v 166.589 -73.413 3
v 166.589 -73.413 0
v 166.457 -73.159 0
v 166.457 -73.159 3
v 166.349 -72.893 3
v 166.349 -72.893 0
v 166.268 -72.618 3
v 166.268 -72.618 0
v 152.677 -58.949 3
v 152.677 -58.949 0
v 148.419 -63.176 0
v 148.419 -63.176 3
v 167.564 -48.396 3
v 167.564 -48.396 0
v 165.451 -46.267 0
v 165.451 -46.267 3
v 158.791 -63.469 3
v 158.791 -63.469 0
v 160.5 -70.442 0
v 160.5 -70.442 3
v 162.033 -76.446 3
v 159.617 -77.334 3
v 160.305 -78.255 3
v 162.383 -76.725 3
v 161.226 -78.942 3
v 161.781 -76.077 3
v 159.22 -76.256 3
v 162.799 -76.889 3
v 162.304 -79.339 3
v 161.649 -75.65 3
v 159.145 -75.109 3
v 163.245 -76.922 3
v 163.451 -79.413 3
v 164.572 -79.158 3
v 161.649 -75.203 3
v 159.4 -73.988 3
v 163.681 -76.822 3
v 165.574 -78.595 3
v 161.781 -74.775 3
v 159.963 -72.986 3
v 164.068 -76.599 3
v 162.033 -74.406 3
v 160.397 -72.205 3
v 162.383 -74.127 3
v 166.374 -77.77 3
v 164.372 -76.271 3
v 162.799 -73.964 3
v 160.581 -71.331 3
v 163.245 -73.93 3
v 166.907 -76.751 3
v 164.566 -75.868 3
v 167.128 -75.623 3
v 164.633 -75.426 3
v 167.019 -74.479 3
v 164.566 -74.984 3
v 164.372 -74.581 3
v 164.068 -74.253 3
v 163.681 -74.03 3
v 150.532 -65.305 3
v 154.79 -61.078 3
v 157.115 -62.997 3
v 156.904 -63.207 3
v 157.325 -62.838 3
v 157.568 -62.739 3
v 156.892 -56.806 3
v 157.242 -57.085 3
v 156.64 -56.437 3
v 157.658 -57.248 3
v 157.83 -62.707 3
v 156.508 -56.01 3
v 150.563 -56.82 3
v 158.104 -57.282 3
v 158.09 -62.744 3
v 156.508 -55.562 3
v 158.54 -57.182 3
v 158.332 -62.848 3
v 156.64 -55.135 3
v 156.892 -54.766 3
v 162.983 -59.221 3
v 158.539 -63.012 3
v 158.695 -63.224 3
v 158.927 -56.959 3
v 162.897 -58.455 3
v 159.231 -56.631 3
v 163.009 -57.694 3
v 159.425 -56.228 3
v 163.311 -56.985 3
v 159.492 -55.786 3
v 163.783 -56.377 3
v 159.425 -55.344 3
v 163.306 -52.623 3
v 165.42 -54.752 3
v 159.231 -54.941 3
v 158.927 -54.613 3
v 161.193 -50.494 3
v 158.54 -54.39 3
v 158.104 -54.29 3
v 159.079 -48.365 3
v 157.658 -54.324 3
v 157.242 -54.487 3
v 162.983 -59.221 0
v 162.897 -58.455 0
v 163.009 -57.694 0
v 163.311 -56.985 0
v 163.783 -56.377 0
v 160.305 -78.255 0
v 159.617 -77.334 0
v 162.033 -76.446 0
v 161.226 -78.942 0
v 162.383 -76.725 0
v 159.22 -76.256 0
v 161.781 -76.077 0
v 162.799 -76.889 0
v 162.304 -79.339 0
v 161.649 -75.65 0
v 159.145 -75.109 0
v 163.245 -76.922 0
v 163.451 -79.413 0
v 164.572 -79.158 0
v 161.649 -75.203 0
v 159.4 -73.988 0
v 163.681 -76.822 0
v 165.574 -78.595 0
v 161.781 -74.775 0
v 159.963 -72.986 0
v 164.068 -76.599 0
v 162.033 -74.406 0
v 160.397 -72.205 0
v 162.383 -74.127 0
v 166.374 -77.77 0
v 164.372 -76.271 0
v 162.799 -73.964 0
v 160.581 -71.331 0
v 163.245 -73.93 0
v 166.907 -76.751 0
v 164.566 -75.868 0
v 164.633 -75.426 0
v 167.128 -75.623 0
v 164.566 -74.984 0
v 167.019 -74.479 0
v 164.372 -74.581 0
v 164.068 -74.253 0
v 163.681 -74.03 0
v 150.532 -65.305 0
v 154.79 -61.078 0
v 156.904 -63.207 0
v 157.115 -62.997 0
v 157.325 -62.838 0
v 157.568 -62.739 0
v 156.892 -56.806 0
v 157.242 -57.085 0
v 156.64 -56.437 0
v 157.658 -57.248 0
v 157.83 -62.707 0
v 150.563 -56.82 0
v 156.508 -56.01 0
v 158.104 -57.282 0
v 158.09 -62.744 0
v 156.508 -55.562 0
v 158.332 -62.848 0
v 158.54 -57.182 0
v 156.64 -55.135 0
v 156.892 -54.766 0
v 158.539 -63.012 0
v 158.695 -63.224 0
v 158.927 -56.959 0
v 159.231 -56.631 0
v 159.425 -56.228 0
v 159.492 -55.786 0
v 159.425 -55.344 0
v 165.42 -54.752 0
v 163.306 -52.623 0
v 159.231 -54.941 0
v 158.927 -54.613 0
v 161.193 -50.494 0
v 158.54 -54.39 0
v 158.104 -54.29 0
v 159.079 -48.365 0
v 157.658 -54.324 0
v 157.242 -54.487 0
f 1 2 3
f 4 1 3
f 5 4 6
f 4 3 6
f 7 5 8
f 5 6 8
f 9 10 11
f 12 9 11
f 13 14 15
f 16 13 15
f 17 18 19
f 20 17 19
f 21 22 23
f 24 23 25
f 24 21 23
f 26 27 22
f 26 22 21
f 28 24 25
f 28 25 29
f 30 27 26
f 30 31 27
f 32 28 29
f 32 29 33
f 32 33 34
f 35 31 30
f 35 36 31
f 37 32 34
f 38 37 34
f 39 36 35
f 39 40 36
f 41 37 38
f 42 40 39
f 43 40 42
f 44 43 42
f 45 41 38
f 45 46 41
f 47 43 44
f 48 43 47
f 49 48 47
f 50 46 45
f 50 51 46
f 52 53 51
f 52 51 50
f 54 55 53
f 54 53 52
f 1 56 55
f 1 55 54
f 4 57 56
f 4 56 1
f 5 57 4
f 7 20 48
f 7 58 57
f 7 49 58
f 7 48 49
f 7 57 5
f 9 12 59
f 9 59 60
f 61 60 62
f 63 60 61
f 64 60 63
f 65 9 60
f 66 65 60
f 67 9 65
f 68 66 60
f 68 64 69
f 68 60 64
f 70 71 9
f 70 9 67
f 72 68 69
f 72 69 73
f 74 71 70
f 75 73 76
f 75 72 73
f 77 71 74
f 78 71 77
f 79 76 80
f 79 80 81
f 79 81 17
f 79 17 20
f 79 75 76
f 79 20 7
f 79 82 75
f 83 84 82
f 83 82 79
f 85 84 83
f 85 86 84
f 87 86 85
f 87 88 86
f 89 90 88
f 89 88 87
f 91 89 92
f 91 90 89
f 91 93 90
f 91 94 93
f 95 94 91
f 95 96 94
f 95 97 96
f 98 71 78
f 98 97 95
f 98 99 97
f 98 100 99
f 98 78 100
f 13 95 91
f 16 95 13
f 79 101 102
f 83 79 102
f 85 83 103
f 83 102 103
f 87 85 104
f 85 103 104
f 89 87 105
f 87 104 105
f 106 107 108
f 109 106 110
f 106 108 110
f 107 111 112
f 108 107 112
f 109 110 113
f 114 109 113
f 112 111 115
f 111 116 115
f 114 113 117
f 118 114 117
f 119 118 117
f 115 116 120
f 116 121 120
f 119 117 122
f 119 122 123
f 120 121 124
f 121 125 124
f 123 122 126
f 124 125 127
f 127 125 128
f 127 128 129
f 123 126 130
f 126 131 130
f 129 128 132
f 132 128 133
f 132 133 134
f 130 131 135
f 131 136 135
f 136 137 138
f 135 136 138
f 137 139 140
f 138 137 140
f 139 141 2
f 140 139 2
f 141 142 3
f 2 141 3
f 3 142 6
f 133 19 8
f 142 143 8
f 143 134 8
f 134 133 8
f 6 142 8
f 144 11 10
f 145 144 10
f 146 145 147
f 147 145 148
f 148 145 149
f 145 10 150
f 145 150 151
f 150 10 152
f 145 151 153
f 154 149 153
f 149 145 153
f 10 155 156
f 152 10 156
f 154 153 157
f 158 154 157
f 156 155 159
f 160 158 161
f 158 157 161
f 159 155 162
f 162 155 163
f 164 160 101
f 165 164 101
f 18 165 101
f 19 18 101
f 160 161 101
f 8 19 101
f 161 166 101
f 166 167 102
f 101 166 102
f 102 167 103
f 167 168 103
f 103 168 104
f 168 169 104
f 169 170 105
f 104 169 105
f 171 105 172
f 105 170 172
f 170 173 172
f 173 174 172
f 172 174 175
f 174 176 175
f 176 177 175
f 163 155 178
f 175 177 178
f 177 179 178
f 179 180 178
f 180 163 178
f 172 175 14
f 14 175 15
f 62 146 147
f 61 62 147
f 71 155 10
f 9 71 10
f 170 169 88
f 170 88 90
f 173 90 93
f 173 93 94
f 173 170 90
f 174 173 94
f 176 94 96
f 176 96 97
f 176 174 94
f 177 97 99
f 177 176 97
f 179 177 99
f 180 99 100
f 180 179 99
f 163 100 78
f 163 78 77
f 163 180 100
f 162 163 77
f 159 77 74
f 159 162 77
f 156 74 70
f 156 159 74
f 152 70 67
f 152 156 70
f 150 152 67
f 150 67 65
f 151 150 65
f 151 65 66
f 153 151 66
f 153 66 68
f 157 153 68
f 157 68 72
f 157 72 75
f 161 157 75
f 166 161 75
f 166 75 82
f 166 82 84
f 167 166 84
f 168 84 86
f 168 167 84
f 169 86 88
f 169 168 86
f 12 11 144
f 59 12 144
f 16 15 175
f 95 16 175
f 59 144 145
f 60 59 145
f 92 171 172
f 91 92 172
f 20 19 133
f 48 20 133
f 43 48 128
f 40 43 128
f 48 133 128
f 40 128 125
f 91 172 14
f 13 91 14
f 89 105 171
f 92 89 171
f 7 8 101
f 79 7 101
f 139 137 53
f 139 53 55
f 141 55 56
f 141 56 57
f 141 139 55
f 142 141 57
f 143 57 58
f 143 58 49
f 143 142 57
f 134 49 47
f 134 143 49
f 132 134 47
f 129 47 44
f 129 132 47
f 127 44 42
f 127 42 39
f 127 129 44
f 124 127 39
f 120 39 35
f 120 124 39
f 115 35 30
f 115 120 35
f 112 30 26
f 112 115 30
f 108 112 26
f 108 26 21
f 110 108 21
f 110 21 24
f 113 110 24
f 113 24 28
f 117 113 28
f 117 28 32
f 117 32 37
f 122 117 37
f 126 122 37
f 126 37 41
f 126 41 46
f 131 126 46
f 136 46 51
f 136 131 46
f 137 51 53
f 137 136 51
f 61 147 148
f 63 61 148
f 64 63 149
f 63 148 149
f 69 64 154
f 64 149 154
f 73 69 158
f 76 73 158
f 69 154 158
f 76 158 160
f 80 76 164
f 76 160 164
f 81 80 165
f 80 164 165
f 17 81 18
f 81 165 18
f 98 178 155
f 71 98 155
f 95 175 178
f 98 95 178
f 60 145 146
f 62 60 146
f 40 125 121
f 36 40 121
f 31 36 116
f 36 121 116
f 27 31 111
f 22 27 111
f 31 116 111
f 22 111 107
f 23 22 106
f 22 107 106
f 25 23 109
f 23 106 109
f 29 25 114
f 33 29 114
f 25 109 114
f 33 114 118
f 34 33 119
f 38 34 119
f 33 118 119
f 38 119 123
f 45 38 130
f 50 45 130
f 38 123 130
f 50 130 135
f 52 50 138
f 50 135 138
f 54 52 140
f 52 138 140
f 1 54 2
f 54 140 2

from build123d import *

# Parameters (mm, degrees)
ESQUISSE15_R        = 1.5
BOSS_EXTRU_15_DEPTH = 3


with BuildPart() as part:
    # Esquisse15 → Boss.-Extru.15 (new body)
    with BuildSketch(Plane.XY):
        with BuildLine():
            Line((159.079156624, -48.365258544), (150.563075986, -56.819628453))
            Line((150.563075986, -56.819628453), (152.676668463, -58.948648613))
            Line((152.676668463, -58.948648613), (148.418628144, -63.175833567))
            Line((148.418628144, -63.175833567), (150.532220621, -65.304853727))
            Line((150.532220621, -65.304853727), (154.790260941, -61.077668772))
            Line((154.790260941, -61.077668772), (156.903853418, -63.206688932))
            Line((156.903853418, -63.206688932), (157.114961916, -62.997110206))
            ThreePointArc((157.114961916, -62.997110206), (158.090398383, -62.744177685), (158.790743402, -63.468724451))
            Line((158.790743402, -63.468724451), (160.499830137, -70.44157839))
            ThreePointArc((160.499830137, -70.44157839), (160.521490891, -71.774910136), (159.963165383, -72.985907807))
            ThreePointArc((159.963165383, -72.985907807), (162.875303574, -79.417825737), (166.589129616, -73.413026553))
            ThreePointArc((166.589129616, -73.413026553), (166.3998932, -73.026858147), (166.267814939, -72.617600535))
            Line((166.267814939, -72.617600535), (162.983107766, -59.220583964))
            ThreePointArc((162.983107766, -59.220583964), (163.008961454, -57.693583939), (163.783215914, -56.377176889))
            Line((163.783215914, -56.377176889), (165.419934056, -54.752319023))
            Line((165.419934056, -54.752319023), (163.306341579, -52.623298863))
            Line((163.306341579, -52.623298863), (167.564381898, -48.396113909))
            Line((167.564381898, -48.396113909), (165.450789421, -46.267093749))
            Line((165.450789421, -46.267093749), (161.192749102, -50.494278704))
            Line((161.192749102, -50.494278704), (159.079156624, -48.365258544))
        make_face()
        with Locations((157.991505021, -55.785973738)):
            Circle(ESQUISSE15_R, mode=Mode.SUBTRACT)
        with Locations((163.132615018, -75.426110464)):
            Circle(ESQUISSE15_R, mode=Mode.SUBTRACT)
    extrude(amount=BOSS_EXTRU_15_DEPTH)


solid = part.part
